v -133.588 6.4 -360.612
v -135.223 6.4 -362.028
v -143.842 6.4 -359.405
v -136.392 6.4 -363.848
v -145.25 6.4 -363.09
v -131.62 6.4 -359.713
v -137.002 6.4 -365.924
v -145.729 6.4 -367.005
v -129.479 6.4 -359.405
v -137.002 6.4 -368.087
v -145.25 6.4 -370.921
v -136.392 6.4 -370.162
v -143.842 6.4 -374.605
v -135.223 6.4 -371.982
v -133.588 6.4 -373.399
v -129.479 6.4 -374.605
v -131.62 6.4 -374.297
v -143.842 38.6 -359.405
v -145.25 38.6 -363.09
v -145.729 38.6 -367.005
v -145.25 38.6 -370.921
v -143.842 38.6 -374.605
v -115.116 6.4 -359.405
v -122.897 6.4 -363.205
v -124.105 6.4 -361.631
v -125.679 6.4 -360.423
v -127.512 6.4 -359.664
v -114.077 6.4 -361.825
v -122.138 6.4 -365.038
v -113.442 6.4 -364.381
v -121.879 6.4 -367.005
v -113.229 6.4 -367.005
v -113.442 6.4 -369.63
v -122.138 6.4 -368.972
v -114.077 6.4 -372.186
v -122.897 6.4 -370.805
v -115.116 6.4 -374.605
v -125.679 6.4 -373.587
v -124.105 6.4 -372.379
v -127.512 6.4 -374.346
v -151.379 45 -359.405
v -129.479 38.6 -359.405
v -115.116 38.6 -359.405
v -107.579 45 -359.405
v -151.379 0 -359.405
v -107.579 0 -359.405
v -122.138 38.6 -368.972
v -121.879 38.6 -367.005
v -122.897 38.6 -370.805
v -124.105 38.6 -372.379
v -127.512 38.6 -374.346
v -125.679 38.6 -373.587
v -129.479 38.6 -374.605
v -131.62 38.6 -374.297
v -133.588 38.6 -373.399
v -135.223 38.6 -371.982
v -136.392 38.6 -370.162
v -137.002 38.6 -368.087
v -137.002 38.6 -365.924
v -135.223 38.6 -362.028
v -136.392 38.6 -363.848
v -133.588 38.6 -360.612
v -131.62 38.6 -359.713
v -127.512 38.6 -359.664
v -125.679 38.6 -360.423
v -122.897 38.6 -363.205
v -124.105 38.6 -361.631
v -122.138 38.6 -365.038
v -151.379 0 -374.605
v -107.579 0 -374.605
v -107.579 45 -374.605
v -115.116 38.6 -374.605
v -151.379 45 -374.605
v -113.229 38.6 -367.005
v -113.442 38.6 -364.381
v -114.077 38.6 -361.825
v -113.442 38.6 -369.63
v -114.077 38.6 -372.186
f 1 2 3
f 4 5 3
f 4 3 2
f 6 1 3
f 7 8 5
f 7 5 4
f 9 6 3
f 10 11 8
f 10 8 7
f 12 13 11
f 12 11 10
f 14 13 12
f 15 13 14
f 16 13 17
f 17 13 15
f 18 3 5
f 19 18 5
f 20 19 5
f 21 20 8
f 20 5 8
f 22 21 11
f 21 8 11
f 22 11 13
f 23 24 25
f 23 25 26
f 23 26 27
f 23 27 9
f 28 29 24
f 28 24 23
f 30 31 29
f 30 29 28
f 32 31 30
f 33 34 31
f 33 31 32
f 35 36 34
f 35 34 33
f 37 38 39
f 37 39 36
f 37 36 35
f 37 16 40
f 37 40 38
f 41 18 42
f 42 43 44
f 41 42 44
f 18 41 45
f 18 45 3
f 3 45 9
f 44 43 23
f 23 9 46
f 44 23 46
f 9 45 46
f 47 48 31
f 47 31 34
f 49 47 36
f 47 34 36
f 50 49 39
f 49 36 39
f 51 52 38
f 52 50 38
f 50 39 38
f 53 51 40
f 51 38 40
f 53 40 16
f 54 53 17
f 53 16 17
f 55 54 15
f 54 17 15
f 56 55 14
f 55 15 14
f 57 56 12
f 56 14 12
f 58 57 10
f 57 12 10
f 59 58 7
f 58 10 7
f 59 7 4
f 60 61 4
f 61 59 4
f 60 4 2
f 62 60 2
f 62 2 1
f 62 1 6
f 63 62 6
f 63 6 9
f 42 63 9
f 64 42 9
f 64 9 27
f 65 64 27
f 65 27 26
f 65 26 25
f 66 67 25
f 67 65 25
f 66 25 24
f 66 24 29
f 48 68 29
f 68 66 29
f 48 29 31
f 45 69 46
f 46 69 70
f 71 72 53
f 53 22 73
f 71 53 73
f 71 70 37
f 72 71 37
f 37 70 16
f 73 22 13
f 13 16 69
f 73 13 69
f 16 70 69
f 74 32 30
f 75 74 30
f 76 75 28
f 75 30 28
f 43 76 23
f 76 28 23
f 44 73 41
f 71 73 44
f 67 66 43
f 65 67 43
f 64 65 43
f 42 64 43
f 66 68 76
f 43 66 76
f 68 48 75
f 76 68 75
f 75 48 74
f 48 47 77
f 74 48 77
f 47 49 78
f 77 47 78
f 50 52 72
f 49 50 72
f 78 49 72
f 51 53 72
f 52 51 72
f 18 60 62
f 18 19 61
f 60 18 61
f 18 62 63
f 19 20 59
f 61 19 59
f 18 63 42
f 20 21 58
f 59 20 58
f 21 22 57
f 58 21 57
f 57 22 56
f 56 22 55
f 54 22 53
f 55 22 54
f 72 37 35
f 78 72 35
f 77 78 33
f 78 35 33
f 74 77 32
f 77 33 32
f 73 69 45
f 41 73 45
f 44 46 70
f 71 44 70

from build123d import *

# Parameters (mm, degrees)
BOSS_EXTRUDE1_DEPTH   = 45
SKETCH1_R             = 7.6
BOSS_EXTRUDE1_2_DEPTH = 45
BOSS_EXTRUDE1_3_DEPTH = 45
SKETCH1_3_W           = 43.8
SKETCH1_3_H           = 15.2
BOSS_EXTRUDE2_DEPTH   = 6.4
SKETCH2_W             = 43.8
SKETCH2_H             = 15.2
BOSS_EXTRUDE3_DEPTH   = 6.4


with BuildPart() as part:
    # Sketch1 → Boss-Extrude1 (new body)
    with BuildSketch(Plane(origin=(0, 0, 0), x_dir=(1, 0, 0), z_dir=(0, 1, 0))):
        with BuildLine():
            Line((-143.842181684, 374.605263158), (-151.378947368, 374.605263158))
            Line((-151.378947368, 374.605263158), (-151.378947368, 359.405263158))
            Line((-151.378947368, 359.405263158), (-143.842181684, 359.405263158))
            ThreePointArc((-143.842181684, 359.405263158), (-145.728947368, 367.005263158), (-143.842181684, 374.605263158))
        make_face()
    extrude(amount=BOSS_EXTRUDE1_DEPTH)



with BuildPart() as body_2:
    # Sketch1 → Boss-Extrude1 2 (new body)
    with BuildSketch(Plane(origin=(0, 0, 0), x_dir=(1, 0, 0), z_dir=(0, 1, 0))):
        with Locations((-129.478947368, 367.005263158)):
            Circle(SKETCH1_R)
    extrude(amount=BOSS_EXTRUDE1_2_DEPTH)


with BuildPart() as body_3:
    # Sketch1 → Boss-Extrude1 3 (new body)
    with BuildSketch(Plane(origin=(0, 0, 0), x_dir=(1, 0, 0), z_dir=(0, 1, 0))):
        with BuildLine():
            Line((-107.578947368, 374.605263158), (-115.115713053, 374.605263158))
            ThreePointArc((-115.115713053, 374.605263158), (-113.228947368, 367.005263158), (-115.115713053, 359.405263158))
            Line((-115.115713053, 359.405263158), (-107.578947368, 359.405263158))
            Line((-107.578947368, 359.405263158), (-107.578947368, 374.605263158))
        make_face()
    extrude(amount=BOSS_EXTRUDE1_3_DEPTH)


with BuildPart() as part_1:
    add(part.part)

    add(body_2.part)  # Boss-Extrude2 merges body 2

    add(body_3.part)  # Boss-Extrude2 merges body 3
    # Sketch1<3> → Boss-Extrude2 (add)
    with BuildSketch(Plane(origin=(0, 0, 0), x_dir=(1, 0, 0), z_dir=(0, 1, 0))):
        with Locations((-129.478947368, 367.005263158)):
            Rectangle(SKETCH1_3_W, SKETCH1_3_H)
    extrude(amount=BOSS_EXTRUDE2_DEPTH)

    # Sketch2 → Boss-Extrude3 (add)
    with BuildSketch(Plane(origin=(0, 45, 0), x_dir=(1, 0, 0), z_dir=(0, 1, 0))):
        with Locations((-129.478947368, 367.005263158)):
            Rectangle(SKETCH2_W, SKETCH2_H)
    extrude(amount=-BOSS_EXTRUDE3_DEPTH)


solid = part_1.part
